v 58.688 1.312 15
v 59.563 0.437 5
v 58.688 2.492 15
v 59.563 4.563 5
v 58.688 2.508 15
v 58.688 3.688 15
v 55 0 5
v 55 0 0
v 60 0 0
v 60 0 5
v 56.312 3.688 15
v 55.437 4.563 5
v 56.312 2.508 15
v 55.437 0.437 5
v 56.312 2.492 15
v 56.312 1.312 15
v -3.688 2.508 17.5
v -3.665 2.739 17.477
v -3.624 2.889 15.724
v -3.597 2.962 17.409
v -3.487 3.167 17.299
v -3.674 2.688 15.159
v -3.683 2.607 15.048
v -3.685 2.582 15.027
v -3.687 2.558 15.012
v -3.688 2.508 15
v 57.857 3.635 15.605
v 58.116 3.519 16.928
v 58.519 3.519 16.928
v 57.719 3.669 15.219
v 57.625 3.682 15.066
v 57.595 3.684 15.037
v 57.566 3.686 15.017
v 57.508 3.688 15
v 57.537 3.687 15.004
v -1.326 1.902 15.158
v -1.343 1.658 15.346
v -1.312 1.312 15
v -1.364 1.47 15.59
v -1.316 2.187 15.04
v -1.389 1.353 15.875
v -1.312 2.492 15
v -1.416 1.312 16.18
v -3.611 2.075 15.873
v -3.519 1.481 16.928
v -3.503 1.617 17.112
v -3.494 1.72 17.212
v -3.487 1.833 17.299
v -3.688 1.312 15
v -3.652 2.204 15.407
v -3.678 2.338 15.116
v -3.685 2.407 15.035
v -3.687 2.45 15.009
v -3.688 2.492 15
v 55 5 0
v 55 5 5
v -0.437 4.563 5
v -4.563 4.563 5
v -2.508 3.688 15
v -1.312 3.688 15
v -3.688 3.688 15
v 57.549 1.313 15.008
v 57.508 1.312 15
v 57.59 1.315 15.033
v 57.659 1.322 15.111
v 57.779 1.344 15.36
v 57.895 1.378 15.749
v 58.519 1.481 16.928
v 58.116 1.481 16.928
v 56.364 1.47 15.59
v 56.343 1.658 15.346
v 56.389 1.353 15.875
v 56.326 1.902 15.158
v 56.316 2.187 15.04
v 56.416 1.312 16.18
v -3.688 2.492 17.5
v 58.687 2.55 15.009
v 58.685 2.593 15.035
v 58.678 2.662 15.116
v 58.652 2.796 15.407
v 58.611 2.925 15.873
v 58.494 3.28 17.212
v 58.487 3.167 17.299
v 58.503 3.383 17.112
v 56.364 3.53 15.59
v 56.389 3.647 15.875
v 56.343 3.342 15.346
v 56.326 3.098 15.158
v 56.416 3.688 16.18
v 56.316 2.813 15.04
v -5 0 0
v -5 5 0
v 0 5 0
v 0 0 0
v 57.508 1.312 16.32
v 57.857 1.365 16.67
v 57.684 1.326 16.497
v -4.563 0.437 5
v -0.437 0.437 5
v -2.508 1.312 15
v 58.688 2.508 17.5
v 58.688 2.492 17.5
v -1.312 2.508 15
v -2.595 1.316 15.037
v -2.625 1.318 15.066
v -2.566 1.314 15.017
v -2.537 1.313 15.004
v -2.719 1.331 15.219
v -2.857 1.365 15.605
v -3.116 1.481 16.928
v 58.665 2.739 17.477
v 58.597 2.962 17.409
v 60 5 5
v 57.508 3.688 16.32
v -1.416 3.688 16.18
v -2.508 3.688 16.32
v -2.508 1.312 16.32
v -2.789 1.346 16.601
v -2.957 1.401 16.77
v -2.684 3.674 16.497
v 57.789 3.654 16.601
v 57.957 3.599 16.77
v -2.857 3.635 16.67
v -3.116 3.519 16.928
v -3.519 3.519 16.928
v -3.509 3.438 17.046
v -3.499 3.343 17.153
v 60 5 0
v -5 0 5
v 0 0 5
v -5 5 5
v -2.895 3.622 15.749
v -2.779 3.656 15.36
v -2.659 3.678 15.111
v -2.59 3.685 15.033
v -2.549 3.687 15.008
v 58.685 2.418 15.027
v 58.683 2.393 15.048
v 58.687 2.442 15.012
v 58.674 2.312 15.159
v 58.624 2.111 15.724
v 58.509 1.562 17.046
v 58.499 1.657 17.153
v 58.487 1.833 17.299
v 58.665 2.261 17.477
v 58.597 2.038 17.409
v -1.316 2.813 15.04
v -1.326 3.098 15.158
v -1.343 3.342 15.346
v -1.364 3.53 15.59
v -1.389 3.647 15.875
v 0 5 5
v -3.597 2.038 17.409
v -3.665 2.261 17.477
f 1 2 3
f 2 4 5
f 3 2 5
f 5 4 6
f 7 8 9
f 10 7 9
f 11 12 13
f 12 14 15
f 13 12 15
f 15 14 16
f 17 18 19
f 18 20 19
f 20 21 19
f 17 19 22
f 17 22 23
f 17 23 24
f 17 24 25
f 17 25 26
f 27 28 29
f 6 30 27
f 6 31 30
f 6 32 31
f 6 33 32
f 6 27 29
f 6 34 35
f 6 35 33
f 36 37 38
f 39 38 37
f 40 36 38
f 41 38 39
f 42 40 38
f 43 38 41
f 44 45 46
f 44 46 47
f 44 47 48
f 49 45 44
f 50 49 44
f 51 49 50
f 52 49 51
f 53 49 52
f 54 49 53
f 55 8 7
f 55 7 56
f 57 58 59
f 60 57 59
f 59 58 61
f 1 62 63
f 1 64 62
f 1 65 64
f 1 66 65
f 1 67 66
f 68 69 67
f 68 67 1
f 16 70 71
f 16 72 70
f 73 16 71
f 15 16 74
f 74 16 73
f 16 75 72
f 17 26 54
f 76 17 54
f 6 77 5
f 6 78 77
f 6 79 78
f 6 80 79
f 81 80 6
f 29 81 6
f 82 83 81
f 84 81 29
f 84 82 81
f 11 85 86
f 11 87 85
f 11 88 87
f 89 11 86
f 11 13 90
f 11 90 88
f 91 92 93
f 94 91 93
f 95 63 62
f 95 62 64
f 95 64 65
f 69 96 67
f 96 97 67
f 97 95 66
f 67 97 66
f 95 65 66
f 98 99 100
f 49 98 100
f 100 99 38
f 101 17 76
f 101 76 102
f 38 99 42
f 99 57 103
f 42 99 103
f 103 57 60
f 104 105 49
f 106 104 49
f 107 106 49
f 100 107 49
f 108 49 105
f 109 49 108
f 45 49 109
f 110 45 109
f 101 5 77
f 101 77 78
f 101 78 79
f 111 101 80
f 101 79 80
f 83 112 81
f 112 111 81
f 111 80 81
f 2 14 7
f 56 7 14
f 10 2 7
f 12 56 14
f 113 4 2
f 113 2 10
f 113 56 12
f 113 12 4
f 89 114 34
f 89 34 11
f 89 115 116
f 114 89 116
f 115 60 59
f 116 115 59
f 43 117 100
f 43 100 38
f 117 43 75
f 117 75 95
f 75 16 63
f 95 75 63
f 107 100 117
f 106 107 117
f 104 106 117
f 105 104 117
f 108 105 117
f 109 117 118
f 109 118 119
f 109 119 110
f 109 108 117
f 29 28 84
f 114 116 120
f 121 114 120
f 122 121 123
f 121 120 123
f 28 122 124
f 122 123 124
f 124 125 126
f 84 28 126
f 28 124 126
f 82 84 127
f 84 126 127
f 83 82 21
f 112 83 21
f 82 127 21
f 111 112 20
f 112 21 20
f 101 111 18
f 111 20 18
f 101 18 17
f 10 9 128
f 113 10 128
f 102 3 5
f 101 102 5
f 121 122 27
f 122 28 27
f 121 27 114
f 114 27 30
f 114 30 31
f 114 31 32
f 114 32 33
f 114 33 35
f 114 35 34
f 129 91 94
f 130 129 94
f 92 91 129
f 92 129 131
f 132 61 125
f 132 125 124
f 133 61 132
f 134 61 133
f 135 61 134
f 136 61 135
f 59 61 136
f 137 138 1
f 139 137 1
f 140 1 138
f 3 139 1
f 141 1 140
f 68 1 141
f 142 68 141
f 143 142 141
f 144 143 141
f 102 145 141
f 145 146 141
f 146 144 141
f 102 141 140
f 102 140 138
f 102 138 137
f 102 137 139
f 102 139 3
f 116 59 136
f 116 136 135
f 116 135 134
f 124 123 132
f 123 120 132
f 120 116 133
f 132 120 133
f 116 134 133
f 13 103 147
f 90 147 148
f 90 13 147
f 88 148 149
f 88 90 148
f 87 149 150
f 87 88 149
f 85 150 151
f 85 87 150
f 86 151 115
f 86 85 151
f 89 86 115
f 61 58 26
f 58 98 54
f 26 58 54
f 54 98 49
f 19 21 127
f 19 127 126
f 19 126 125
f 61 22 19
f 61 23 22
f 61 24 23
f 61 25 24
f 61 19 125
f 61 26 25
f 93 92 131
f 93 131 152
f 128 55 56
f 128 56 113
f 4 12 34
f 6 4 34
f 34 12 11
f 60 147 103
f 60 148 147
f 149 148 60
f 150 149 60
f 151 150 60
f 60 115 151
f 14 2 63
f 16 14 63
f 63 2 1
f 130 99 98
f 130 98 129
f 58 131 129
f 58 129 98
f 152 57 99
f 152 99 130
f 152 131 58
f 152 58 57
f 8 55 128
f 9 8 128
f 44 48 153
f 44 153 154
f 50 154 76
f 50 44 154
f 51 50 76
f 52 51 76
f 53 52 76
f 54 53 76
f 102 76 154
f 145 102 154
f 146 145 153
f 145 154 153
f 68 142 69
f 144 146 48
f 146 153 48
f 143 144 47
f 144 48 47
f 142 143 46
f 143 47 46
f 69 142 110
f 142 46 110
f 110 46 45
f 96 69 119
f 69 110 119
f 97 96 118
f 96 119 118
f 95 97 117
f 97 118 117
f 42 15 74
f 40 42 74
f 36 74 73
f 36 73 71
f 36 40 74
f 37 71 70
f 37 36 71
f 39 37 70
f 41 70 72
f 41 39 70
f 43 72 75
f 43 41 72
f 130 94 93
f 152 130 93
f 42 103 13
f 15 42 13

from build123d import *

# Parameters (mm, degrees)
F0_W         = 5
F0_H         = 5
F1_DEPTH     = 5
F2_DEPTH     = 15
F2_TAPER     = 5
F4_DEPTH     = 2.5
F5_T4_DEPTH  = 8.4
F5_T9_DEPTH  = 8.4
F5_T14_DEPTH = 8.4
F5_T19_DEPTH = 8.4
F5_T24_DEPTH = 8.4
F5_T29_DEPTH = 8.4
F5_T34_DEPTH = 8.4
F5_T39_DEPTH = 8.4
F6_T1_DEPTH  = 65.9153400942
F6_T6_DEPTH  = 63.5246599058
F6_T12_DEPTH = 63.5246599058


# Not quite as in the source:
# - a fillet or chamfer that OpenCascade refuses, or shapes differently, is made with other operations: its cross-section is extruded or revolved along the edge and cut away or added


with BuildPart() as f1:
    # F0 (on Top) → F1 (new body)
    with BuildSketch(Plane.XY):
        with Locations((-2.5, 2.5)):
            Rectangle(F0_W, F0_H)
    extrude(amount=F1_DEPTH)

    # F0 (on Top) → F2 (join)
    with BuildSketch(Plane.XY):
        with Locations((-2.5, 2.5)):
            Rectangle(F0_W, F0_H)
    extrude(amount=F2_DEPTH, taper=F2_TAPER)



with BuildPart() as f1b:
    # F0 (on Top) → F1, piece 2 (new body)
    with BuildSketch(Plane.XY):
        with Locations((57.5, 2.5)):
            Rectangle(F0_W, F0_H)
    extrude(amount=F1_DEPTH)

    # F0 (on Top) → F2, piece 2 (join)
    with BuildSketch(Plane.XY):
        with Locations((57.5, 2.5)):
            Rectangle(F0_W, F0_H)
    extrude(amount=F2_DEPTH, taper=F2_TAPER)


with BuildPart() as f1_1:
    add(f1.part)

    add(f1b.part)  # F4 merges F1b
    # F3 (on face) → F4 (join)
    with BuildSketch(Plane.XY.offset(15)):
        Polygon((-1.3123299529, 3.6876700471), (-3.6876700471, 3.6876700471), (-3.6876700471, 1.3123299529), (-1.3123299529, 1.3123299529), (56.3123299529, 1.3123299529), (58.6876700471, 1.3123299529), (58.6876700471, 3.6876700471), (56.3123299529, 3.6876700471), align=None)
    extrude(amount=F4_DEPTH)

    # F5: fillet of radius 1.18 on 4 edges, made by hand


with BuildPart() as f5_tool2:
    # F5_s3 → F5_t4 (new body)
    with BuildSketch(Plane.XY.offset(12.05)):
        with BuildLine():
            ThreePointArc((58.6876700471, 2.5076700471), (58.3420560489, 3.3420560489), (57.5076700471, 3.6876700471))
            Line((57.5076700471, 3.6876700471), (58.6876700471, 3.6876700471))
            Line((58.6876700471, 3.6876700471), (58.6876700471, 2.5076700471))
        make_face()
    extrude(amount=F5_T4_DEPTH)

    split(bisect_by=Plane(origin=(0, 4.9620193825, 0.4341204442), x_dir=(1, 0, 0), z_dir=(0, 0.9961946981, 0.0871557427)), keep=Keep.TOP)


with BuildPart() as f1_2:
    add(f1_1.part)

    # F5_t1: cut F5_tool2
    add(f5_tool2.part, mode=Mode.SUBTRACT)


with BuildPart() as f5_tool7:
    # F5_s8 → F5_t9 (new body)
    with BuildSketch(Plane.XY.offset(12.05)):
        with BuildLine():
            ThreePointArc((58.6876700471, 2.5076700471), (58.3420560489, 3.3420560489), (57.5076700471, 3.6876700471))
            Line((57.5076700471, 3.6876700471), (58.6876700471, 3.6876700471))
            Line((58.6876700471, 3.6876700471), (58.6876700471, 2.5076700471))
        make_face()
    extrude(amount=F5_T9_DEPTH)

    split(bisect_by=Plane(origin=(59.5442325904, 0, 5.20944533), x_dir=(0, 1, 0), z_dir=(0.9961946981, 0, 0.0871557427)), keep=Keep.TOP)


with BuildPart() as f1_3:
    add(f1_2.part)

    # F5_t6: cut F5_tool7
    add(f5_tool7.part, mode=Mode.SUBTRACT)


with BuildPart() as f5_tool12:
    # F5_s13 → F5_t14 (new body)
    with BuildSketch(Plane.XY.offset(12.05)):
        with BuildLine():
            ThreePointArc((57.5076700471, 1.3123299529), (58.3420560489, 1.6579439511), (58.6876700471, 2.4923299529))
            Line((58.6876700471, 2.4923299529), (58.6876700471, 1.3123299529))
            Line((58.6876700471, 1.3123299529), (57.5076700471, 1.3123299529))
        make_face()
    extrude(amount=F5_T14_DEPTH)

    split(bisect_by=Plane(origin=(59.5442325904, 0, 5.20944533), x_dir=(0, 1, 0), z_dir=(0.9961946981, 0, 0.0871557427)), keep=Keep.TOP)


with BuildPart() as f1_4:
    add(f1_3.part)

    # F5_t11: cut F5_tool12
    add(f5_tool12.part, mode=Mode.SUBTRACT)


with BuildPart() as f5_tool17:
    # F5_s18 → F5_t19 (new body)
    with BuildSketch(Plane.XY.offset(12.05)):
        with BuildLine():
            ThreePointArc((57.5076700471, 1.3123299529), (58.3420560489, 1.6579439511), (58.6876700471, 2.4923299529))
            Line((58.6876700471, 2.4923299529), (58.6876700471, 1.3123299529))
            Line((58.6876700471, 1.3123299529), (57.5076700471, 1.3123299529))
        make_face()
    extrude(amount=F5_T19_DEPTH)

    split(bisect_by=Plane(origin=(0, 0, 0), x_dir=(1, 0, 0), z_dir=(0, -0.9961946981, 0.0871557427)), keep=Keep.TOP)


with BuildPart() as f1_5:
    add(f1_4.part)

    # F5_t16: cut F5_tool17
    add(f5_tool17.part, mode=Mode.SUBTRACT)


with BuildPart() as f5_tool22:
    # F5_s23 → F5_t24 (new body)
    with BuildSketch(Plane.XY.offset(12.05)):
        with BuildLine():
            ThreePointArc((-2.5076700471, 3.6876700471), (-3.3420560489, 3.3420560489), (-3.6876700471, 2.5076700471))
            Line((-3.6876700471, 2.5076700471), (-3.6876700471, 3.6876700471))
            Line((-3.6876700471, 3.6876700471), (-2.5076700471, 3.6876700471))
        make_face()
    extrude(amount=F5_T24_DEPTH)

    split(bisect_by=Plane(origin=(-4.9620193825, 0, 0.4341204442), x_dir=(0, 1, 0), z_dir=(-0.9961946981, 0, 0.0871557427)), keep=Keep.TOP)


with BuildPart() as f1_6:
    add(f1_5.part)

    # F5_t21: cut F5_tool22
    add(f5_tool22.part, mode=Mode.SUBTRACT)


with BuildPart() as f5_tool27:
    # F5_s28 → F5_t29 (new body)
    with BuildSketch(Plane.XY.offset(12.05)):
        with BuildLine():
            ThreePointArc((-2.5076700471, 3.6876700471), (-3.3420560489, 3.3420560489), (-3.6876700471, 2.5076700471))
            Line((-3.6876700471, 2.5076700471), (-3.6876700471, 3.6876700471))
            Line((-3.6876700471, 3.6876700471), (-2.5076700471, 3.6876700471))
        make_face()
    extrude(amount=F5_T29_DEPTH)

    split(bisect_by=Plane(origin=(0, 4.9620193825, 0.4341204442), x_dir=(1, 0, 0), z_dir=(0, 0.9961946981, 0.0871557427)), keep=Keep.TOP)


with BuildPart() as f1_7:
    add(f1_6.part)

    # F5_t26: cut F5_tool27
    add(f5_tool27.part, mode=Mode.SUBTRACT)


with BuildPart() as f5_tool32:
    # F5_s33 → F5_t34 (new body)
    with BuildSketch(Plane.XY.offset(12.05)):
        with BuildLine():
            ThreePointArc((-2.5076700471, 1.3123299529), (-3.3420560489, 1.6579439511), (-3.6876700471, 2.4923299529))
            Line((-3.6876700471, 2.4923299529), (-3.6876700471, 1.3123299529))
            Line((-3.6876700471, 1.3123299529), (-2.5076700471, 1.3123299529))
        make_face()
    extrude(amount=F5_T34_DEPTH)

    split(bisect_by=Plane(origin=(-4.9620193825, 0, 0.4341204442), x_dir=(0, 1, 0), z_dir=(-0.9961946981, 0, 0.0871557427)), keep=Keep.TOP)


with BuildPart() as f1_8:
    add(f1_7.part)

    # F5_t31: cut F5_tool32
    add(f5_tool32.part, mode=Mode.SUBTRACT)


with BuildPart() as f5_tool37:
    # F5_s38 → F5_t39 (new body)
    with BuildSketch(Plane.XY.offset(12.05)):
        with BuildLine():
            ThreePointArc((-2.5076700471, 1.3123299529), (-3.3420560489, 1.6579439511), (-3.6876700471, 2.4923299529))
            Line((-3.6876700471, 2.4923299529), (-3.6876700471, 1.3123299529))
            Line((-3.6876700471, 1.3123299529), (-2.5076700471, 1.3123299529))
        make_face()
    extrude(amount=F5_T39_DEPTH)

    split(bisect_by=Plane(origin=(0, 0, 0), x_dir=(1, 0, 0), z_dir=(0, -0.9961946981, 0.0871557427)), keep=Keep.TOP)


with BuildPart() as f1_9:
    add(f1_8.part)

    # F5_t36: cut F5_tool37
    add(f5_tool37.part, mode=Mode.SUBTRACT)

    # F6: fillet of radius 1.18 on 8 edges, made by hand

    # F6_s2 → F6_t1 (cut)
    with BuildSketch(Plane.YZ.offset(-5.4576700471)):
        with BuildLine():
            ThreePointArc((3.6876700471, 16.32), (3.3420560489, 17.1543860018), (2.5076700471, 17.5))
            Line((2.5076700471, 17.5), (3.6876700471, 17.5))
            Line((3.6876700471, 17.5), (3.6876700471, 16.32))
        make_face()
        with BuildLine():
            ThreePointArc((2.4923299529, 17.5), (1.6579439511, 17.1543860018), (1.3123299529, 16.32))
            Line((1.3123299529, 16.32), (1.3123299529, 17.5))
            Line((1.3123299529, 17.5), (2.4923299529, 17.5))
        make_face()
    extrude(amount=F6_T1_DEPTH, mode=Mode.SUBTRACT)


with BuildPart() as f6_tool4:
    # F6_s5 → F6_t6 (new body)
    with BuildSketch(Plane.YZ.offset(59.2623299529)):
        with BuildLine():
            ThreePointArc((2.5076700471, 15), (3.3420560489, 15.3456139982), (3.6876700471, 16.18))
            Line((3.6876700471, 16.18), (3.6876700471, 15))
            Line((3.6876700471, 15), (2.5076700471, 15))
        make_face()
    extrude(amount=-F6_T6_DEPTH)

    split(bisect_by=Plane(origin=(54.5822132078, 0, -4.7753248858), x_dir=(0, 1, 0), z_dir=(-0.9961946981, 0, 0.0871557427)), keep=Keep.TOP)

    split(bisect_by=Plane(origin=(0, 0, 0), x_dir=(0, 1, 0), z_dir=(0.9961946981, 0, 0.0871557427)), keep=Keep.TOP)


with BuildPart() as f1_10:
    add(f1_9.part)

    # F6_t3: cut F6_tool4
    add(f6_tool4.part, mode=Mode.SUBTRACT)


with BuildPart() as f6_tool10:
    # F6_s11 → F6_t12 (new body)
    with BuildSketch(Plane.YZ.offset(-4.2623299529)):
        with BuildLine():
            ThreePointArc((2.4923299529, 15), (1.6579439511, 15.3456139982), (1.3123299529, 16.18))
            Line((1.3123299529, 16.18), (1.3123299529, 15))
            Line((1.3123299529, 15), (2.4923299529, 15))
        make_face()
    extrude(amount=F6_T12_DEPTH)

    split(bisect_by=Plane(origin=(54.5822132078, 0, -4.7753248858), x_dir=(0, 1, 0), z_dir=(-0.9961946981, 0, 0.0871557427)), keep=Keep.TOP)

    split(bisect_by=Plane(origin=(0, 0, 0), x_dir=(0, 1, 0), z_dir=(0.9961946981, 0, 0.0871557427)), keep=Keep.TOP)


with BuildPart() as f1_11:
    add(f1_10.part)

    # F6_t9: cut F6_tool10
    add(f6_tool10.part, mode=Mode.SUBTRACT)


solid = f1_11.part
